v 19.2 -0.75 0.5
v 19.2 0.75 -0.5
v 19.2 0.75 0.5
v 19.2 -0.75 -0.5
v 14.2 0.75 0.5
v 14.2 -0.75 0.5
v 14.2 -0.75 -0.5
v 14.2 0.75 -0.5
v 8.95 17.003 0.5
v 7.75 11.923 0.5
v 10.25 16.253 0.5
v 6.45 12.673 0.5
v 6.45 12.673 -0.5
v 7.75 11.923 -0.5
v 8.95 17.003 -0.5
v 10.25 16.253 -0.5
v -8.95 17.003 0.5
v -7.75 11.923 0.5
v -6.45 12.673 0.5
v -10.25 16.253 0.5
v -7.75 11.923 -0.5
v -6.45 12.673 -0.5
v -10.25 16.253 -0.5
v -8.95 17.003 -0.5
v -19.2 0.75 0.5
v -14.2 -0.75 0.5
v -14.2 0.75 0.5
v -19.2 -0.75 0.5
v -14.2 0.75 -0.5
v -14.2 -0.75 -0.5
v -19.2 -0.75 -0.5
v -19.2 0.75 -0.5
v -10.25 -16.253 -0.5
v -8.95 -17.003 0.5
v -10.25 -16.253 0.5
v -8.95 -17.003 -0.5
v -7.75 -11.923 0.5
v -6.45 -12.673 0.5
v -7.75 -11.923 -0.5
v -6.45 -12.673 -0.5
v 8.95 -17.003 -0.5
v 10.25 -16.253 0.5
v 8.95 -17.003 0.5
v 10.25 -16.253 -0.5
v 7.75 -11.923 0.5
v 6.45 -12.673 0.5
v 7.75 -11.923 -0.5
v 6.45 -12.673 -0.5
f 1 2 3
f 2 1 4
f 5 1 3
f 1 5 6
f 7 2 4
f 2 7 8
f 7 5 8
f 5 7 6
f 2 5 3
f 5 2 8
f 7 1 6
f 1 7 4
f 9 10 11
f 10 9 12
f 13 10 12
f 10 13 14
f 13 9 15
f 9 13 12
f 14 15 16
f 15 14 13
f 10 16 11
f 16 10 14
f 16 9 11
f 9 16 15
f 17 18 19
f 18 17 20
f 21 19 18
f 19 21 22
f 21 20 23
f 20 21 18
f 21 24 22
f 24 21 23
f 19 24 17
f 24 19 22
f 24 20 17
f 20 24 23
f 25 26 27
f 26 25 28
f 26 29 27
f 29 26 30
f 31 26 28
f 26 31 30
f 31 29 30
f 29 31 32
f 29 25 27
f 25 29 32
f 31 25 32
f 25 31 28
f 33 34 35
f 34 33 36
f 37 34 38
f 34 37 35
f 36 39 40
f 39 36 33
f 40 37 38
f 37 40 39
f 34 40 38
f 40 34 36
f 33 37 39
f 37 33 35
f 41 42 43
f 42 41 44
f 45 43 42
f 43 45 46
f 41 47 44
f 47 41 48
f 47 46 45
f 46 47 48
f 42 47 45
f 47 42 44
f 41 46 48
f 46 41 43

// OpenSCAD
magnetDims=[5,1.5,1];
poles=6;
rotorDia=20;
minWallThck=0.8; //2 lines
PCBThick=1;

for (ir=[0:360/poles:360*(1-1/poles)])
  rotate(ir) translate([rotorDia-magnetDims.x/2-minWallThck,0,0]) cube(magnetDims,true);
